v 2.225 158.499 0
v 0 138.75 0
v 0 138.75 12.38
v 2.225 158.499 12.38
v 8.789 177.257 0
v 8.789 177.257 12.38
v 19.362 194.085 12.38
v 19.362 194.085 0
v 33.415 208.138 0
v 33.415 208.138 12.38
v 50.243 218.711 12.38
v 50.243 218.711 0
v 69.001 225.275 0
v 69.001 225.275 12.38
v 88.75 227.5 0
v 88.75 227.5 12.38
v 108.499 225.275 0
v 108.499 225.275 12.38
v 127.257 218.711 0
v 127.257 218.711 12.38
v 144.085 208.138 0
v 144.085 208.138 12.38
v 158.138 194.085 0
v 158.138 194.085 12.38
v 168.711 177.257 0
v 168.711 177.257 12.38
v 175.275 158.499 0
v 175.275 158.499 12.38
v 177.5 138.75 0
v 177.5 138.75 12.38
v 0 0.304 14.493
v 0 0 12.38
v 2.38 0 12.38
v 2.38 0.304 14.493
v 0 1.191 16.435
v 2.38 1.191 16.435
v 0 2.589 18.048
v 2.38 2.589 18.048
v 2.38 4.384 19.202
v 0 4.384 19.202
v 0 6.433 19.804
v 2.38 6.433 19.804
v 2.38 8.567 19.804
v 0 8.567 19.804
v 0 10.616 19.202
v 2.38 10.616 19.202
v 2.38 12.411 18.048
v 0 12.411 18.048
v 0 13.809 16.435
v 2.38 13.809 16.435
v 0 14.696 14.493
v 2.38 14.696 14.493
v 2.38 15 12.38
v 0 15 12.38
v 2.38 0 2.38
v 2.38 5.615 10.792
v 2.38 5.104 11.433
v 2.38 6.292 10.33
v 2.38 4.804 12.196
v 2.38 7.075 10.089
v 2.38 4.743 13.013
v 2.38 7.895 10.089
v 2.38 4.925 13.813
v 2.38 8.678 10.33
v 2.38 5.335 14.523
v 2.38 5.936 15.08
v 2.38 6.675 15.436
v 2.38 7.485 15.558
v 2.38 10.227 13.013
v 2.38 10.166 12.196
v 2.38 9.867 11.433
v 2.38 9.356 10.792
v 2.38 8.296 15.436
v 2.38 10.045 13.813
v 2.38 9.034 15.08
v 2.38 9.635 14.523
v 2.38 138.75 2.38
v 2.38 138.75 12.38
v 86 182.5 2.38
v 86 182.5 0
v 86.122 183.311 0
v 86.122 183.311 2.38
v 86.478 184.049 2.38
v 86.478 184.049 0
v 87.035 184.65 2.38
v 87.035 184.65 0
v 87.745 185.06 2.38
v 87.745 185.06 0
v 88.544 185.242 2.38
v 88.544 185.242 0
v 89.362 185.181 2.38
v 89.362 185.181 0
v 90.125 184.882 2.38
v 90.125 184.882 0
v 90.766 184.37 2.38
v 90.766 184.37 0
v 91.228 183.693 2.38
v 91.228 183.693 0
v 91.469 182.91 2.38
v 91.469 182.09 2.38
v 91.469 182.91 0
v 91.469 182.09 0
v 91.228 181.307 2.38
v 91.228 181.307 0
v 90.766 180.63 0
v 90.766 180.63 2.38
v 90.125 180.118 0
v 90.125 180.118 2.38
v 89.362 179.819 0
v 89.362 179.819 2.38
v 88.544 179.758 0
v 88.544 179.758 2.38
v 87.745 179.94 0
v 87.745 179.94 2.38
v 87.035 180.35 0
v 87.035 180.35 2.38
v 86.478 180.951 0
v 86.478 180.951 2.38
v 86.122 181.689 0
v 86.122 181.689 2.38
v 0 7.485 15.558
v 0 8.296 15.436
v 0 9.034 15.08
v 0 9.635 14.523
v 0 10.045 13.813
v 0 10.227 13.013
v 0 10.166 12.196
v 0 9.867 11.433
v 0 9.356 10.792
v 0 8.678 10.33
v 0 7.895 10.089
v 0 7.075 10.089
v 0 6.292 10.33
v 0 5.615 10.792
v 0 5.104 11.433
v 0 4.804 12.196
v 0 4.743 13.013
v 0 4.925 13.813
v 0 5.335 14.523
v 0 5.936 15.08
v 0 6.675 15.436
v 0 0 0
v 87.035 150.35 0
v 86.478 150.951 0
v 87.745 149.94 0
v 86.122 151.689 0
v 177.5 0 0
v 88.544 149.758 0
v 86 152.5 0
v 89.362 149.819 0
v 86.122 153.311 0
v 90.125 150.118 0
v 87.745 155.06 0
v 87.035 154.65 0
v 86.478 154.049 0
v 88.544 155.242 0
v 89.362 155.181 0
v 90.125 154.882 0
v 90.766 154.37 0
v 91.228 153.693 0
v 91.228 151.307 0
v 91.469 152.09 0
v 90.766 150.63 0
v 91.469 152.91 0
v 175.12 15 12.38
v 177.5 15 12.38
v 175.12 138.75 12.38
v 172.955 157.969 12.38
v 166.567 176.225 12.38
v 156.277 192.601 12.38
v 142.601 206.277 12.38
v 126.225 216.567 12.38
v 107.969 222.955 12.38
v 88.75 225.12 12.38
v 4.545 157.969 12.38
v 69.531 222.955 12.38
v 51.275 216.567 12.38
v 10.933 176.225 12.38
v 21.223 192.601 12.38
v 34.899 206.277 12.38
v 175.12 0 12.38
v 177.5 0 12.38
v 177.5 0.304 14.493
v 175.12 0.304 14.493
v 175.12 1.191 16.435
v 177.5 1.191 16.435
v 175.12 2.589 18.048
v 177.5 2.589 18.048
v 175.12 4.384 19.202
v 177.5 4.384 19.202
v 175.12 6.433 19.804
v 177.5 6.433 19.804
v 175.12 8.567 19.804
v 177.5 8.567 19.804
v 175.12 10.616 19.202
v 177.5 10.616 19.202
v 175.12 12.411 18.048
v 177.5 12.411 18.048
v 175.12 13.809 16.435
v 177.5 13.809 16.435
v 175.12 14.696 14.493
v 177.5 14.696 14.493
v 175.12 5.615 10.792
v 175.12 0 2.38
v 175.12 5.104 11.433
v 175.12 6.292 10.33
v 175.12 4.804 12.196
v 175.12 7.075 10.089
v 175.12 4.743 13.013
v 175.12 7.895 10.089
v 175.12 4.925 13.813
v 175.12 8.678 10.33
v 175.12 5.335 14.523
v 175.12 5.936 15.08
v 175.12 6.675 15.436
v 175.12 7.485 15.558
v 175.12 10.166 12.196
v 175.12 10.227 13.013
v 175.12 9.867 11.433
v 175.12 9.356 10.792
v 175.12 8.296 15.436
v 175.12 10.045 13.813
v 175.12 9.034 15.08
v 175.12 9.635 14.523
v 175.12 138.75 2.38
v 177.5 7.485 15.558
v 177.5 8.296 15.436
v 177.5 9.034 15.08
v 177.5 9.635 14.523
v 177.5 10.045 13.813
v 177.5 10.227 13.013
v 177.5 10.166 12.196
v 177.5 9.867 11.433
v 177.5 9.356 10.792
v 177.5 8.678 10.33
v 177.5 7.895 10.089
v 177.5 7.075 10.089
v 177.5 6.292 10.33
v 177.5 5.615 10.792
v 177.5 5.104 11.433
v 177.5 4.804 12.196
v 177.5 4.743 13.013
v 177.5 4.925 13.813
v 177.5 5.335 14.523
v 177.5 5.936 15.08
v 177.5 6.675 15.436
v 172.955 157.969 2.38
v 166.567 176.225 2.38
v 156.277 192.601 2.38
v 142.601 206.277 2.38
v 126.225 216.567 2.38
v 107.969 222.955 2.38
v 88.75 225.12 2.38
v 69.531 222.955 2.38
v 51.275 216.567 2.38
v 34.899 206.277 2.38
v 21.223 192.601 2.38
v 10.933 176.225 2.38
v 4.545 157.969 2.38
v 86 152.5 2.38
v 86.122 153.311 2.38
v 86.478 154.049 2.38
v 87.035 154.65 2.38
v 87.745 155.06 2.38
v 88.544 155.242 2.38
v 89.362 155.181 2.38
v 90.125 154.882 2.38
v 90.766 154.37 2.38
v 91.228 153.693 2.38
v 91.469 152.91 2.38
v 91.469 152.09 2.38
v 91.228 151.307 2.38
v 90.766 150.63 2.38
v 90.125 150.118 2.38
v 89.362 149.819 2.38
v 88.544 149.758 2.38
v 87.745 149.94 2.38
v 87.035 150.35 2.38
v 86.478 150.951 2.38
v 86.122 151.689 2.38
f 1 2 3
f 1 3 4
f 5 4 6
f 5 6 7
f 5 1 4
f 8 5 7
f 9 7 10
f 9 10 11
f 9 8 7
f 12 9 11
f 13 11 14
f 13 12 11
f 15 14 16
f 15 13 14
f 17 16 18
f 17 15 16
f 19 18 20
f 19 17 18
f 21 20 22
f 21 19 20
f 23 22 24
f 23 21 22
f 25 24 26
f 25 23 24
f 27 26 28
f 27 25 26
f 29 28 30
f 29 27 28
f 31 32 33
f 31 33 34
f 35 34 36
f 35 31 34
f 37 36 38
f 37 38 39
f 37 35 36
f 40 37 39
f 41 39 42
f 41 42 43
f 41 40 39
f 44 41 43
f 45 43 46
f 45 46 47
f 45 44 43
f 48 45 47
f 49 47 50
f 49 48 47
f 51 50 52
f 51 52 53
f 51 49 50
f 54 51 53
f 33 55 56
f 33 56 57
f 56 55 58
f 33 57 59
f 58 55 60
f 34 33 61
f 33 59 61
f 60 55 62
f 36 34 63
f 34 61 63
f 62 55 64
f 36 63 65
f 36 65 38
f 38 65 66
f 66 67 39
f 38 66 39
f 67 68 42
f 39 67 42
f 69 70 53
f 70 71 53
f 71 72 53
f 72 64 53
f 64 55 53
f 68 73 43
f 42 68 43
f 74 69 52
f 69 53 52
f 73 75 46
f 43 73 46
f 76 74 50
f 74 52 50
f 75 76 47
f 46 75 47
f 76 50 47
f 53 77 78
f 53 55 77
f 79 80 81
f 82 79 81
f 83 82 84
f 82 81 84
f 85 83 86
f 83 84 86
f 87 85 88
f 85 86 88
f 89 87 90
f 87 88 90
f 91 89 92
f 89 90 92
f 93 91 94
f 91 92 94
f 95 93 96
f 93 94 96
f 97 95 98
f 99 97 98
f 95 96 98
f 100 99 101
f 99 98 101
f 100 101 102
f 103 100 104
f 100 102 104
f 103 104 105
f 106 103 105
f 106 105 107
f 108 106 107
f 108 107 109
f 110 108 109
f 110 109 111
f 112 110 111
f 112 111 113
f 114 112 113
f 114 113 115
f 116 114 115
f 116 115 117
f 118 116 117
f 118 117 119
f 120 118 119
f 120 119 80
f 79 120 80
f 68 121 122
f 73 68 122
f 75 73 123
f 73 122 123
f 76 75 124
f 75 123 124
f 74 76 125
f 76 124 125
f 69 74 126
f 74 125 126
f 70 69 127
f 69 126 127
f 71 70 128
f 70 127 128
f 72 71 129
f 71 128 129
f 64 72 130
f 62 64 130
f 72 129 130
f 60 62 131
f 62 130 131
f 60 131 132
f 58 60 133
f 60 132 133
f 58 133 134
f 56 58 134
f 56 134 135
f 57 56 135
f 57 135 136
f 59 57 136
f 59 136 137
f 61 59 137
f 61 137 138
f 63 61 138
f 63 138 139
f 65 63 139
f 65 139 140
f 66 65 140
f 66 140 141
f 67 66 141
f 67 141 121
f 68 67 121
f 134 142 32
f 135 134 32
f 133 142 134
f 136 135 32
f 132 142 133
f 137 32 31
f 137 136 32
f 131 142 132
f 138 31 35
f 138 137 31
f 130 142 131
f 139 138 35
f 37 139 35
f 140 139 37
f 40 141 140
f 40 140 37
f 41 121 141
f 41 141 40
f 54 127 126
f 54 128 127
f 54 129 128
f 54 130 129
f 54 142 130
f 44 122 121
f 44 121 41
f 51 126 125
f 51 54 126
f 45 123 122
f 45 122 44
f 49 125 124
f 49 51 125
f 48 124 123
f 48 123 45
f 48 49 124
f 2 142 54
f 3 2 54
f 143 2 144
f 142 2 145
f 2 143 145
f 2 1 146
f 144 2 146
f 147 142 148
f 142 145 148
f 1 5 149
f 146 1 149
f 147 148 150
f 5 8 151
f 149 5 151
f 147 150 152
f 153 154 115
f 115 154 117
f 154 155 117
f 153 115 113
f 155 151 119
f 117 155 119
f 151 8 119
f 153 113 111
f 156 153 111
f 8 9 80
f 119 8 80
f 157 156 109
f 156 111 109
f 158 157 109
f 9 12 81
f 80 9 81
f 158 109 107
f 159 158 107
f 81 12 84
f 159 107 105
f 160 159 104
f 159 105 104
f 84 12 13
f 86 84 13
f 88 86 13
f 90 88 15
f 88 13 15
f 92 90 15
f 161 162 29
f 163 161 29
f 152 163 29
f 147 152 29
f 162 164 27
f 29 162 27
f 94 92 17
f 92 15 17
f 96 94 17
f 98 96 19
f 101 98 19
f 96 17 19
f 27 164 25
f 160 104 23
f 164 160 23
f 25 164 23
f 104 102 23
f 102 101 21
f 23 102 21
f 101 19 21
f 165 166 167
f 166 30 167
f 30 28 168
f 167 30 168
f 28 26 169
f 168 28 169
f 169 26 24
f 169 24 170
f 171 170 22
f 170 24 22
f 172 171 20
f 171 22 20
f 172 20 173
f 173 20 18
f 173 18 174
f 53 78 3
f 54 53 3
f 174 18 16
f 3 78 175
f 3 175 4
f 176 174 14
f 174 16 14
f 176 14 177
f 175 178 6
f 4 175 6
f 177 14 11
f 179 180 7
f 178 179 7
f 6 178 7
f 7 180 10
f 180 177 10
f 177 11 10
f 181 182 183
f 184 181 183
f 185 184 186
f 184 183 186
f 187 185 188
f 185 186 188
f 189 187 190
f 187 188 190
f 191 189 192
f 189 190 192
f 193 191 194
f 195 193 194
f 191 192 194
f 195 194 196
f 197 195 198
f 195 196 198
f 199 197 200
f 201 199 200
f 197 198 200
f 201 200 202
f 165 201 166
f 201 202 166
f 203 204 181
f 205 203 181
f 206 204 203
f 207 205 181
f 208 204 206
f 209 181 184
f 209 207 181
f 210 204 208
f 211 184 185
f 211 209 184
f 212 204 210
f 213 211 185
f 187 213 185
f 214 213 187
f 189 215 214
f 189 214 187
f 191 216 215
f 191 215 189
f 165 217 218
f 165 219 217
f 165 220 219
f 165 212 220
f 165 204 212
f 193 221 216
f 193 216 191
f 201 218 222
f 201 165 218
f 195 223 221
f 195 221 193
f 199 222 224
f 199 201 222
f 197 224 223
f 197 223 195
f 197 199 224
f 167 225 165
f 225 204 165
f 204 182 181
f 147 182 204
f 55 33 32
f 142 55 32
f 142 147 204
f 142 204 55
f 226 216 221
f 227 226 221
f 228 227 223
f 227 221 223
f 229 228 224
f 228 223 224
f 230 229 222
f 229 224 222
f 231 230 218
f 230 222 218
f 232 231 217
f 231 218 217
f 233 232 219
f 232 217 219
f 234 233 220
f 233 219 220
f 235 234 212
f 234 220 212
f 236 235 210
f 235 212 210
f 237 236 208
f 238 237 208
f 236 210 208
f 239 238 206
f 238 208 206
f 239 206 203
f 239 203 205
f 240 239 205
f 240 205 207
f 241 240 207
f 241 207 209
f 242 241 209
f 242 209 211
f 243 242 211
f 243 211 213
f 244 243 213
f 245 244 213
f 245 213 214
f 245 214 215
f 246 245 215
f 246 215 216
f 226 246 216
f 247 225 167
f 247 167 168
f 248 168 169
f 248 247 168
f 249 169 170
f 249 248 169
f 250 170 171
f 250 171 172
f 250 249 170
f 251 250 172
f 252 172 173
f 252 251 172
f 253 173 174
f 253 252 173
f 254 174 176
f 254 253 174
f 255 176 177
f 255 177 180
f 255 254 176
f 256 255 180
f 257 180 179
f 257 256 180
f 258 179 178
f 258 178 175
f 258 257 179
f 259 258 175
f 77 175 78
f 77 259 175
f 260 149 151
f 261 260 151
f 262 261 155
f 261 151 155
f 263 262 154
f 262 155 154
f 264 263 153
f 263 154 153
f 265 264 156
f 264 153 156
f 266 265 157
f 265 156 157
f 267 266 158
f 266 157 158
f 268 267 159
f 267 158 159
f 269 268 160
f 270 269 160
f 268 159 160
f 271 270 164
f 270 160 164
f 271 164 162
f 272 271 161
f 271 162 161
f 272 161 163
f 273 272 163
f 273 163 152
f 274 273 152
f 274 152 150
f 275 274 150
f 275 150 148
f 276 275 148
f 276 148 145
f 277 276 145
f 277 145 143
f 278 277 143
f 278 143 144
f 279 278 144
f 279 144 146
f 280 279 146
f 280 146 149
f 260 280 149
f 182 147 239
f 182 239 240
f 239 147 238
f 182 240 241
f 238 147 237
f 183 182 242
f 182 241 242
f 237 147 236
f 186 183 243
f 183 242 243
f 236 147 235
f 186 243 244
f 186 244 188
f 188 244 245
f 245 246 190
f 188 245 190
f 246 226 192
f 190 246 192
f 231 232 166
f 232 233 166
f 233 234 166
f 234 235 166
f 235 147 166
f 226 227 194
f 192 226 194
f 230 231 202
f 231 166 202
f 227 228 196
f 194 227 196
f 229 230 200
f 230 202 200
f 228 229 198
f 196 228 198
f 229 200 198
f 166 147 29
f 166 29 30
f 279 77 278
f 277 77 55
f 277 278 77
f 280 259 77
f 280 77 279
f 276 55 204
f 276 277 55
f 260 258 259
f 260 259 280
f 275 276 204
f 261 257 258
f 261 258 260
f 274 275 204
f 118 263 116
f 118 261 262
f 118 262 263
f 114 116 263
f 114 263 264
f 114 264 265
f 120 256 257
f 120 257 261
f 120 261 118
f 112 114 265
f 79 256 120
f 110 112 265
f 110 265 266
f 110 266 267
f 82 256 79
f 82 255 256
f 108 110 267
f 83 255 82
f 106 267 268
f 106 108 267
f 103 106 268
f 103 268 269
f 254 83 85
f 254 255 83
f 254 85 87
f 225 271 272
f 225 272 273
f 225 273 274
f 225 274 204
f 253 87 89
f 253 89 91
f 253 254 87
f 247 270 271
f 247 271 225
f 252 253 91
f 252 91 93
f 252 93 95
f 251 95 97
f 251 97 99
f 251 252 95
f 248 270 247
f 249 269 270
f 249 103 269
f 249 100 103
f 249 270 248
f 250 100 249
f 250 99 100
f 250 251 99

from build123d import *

# Parameters (mm, degrees)
BOSS_EXTRUDE1_DEPTH = 2.38
BOSS_EXTRUDE2_DEPTH = 10
BOSS_EXTRUDE3_DEPTH = 2.38
BOSS_EXTRUDE4_DEPTH = 2.38
SKETCH5_R           = 2.75
CUT_EXTRUDE1_DEPTH  = 178.5
SKETCH6_R           = 2.75
CUT_EXTRUDE2_DEPTH  = 20.88


with BuildPart() as part:
    # Sketch1 → Boss-Extrude1 (new body)
    with BuildSketch(Plane.XY):
        with BuildLine():
            Line((0, 0), (177.5, 0))
            Line((177.5, 0), (177.5, 138.75))
            ThreePointArc((177.5, 138.75), (88.75, 227.5), (0, 138.75))
            Line((0, 138.75), (0, 0))
        make_face()
    extrude(amount=BOSS_EXTRUDE1_DEPTH)

    # Sketch2 → Boss-Extrude2 (add)
    with BuildSketch(Plane.XY.offset(2.38)):
        with BuildLine():
            Line((175.12, 2.38), (175.12, 138.75))
            ThreePointArc((175.12, 138.75), (88.75, 225.12), (2.38, 138.75))
            Line((2.38, 138.75), (2.38, 2.38))
            Line((2.38, 2.38), (2.38, 0))
            Line((2.38, 0), (0, 0))
            Line((0, 0), (0, 138.75))
            ThreePointArc((0, 138.75), (88.75, 227.5), (177.5, 138.75))
            Line((177.5, 138.75), (177.5, 0))
            Line((177.5, 0), (175.12, 0))
            Line((175.12, 0), (175.12, 2.38))
        make_face()
    extrude(amount=BOSS_EXTRUDE2_DEPTH)

    # Sketch3 → Boss-Extrude3 (add)
    with BuildSketch(Plane(origin=(177.5, 0, 0), x_dir=(0, 0, -1), z_dir=(1, 0, 0))):
        with BuildLine():
            Line((-12.38, 15), (-12.38, 0))
            ThreePointArc((-12.38, 0), (-19.88, 7.5), (-12.38, 15))
        make_face()
    extrude(amount=-BOSS_EXTRUDE3_DEPTH)

    # Sketch4 → Boss-Extrude4 (add)
    with BuildSketch(Plane.ZY):
        with BuildLine():
            Line((12.38, 15), (12.38, 0))
            ThreePointArc((12.38, 0), (19.88, 7.5), (12.38, 15))
        make_face()
    extrude(amount=-BOSS_EXTRUDE4_DEPTH)

    # Sketch5 → Cut-Extrude1 (cut, through all)
    with BuildSketch(Plane.ZY):
        with Locations((12.807918023, 7.485123177)):
            Circle(SKETCH5_R)
    extrude(amount=-CUT_EXTRUDE1_DEPTH, mode=Mode.SUBTRACT)

    # Sketch6 → Cut-Extrude2 (cut, through all)
    with BuildSketch(Plane(origin=(0, 0, 0), x_dir=(-1, 0, 0), z_dir=(0, 0, -1))):
        with Locations((-88.75, 182.5)):
            Circle(SKETCH6_R)
        with Locations((-88.75, 152.5)):
            Circle(SKETCH6_R)
    extrude(amount=-CUT_EXTRUDE2_DEPTH, mode=Mode.SUBTRACT)


solid = part.part
